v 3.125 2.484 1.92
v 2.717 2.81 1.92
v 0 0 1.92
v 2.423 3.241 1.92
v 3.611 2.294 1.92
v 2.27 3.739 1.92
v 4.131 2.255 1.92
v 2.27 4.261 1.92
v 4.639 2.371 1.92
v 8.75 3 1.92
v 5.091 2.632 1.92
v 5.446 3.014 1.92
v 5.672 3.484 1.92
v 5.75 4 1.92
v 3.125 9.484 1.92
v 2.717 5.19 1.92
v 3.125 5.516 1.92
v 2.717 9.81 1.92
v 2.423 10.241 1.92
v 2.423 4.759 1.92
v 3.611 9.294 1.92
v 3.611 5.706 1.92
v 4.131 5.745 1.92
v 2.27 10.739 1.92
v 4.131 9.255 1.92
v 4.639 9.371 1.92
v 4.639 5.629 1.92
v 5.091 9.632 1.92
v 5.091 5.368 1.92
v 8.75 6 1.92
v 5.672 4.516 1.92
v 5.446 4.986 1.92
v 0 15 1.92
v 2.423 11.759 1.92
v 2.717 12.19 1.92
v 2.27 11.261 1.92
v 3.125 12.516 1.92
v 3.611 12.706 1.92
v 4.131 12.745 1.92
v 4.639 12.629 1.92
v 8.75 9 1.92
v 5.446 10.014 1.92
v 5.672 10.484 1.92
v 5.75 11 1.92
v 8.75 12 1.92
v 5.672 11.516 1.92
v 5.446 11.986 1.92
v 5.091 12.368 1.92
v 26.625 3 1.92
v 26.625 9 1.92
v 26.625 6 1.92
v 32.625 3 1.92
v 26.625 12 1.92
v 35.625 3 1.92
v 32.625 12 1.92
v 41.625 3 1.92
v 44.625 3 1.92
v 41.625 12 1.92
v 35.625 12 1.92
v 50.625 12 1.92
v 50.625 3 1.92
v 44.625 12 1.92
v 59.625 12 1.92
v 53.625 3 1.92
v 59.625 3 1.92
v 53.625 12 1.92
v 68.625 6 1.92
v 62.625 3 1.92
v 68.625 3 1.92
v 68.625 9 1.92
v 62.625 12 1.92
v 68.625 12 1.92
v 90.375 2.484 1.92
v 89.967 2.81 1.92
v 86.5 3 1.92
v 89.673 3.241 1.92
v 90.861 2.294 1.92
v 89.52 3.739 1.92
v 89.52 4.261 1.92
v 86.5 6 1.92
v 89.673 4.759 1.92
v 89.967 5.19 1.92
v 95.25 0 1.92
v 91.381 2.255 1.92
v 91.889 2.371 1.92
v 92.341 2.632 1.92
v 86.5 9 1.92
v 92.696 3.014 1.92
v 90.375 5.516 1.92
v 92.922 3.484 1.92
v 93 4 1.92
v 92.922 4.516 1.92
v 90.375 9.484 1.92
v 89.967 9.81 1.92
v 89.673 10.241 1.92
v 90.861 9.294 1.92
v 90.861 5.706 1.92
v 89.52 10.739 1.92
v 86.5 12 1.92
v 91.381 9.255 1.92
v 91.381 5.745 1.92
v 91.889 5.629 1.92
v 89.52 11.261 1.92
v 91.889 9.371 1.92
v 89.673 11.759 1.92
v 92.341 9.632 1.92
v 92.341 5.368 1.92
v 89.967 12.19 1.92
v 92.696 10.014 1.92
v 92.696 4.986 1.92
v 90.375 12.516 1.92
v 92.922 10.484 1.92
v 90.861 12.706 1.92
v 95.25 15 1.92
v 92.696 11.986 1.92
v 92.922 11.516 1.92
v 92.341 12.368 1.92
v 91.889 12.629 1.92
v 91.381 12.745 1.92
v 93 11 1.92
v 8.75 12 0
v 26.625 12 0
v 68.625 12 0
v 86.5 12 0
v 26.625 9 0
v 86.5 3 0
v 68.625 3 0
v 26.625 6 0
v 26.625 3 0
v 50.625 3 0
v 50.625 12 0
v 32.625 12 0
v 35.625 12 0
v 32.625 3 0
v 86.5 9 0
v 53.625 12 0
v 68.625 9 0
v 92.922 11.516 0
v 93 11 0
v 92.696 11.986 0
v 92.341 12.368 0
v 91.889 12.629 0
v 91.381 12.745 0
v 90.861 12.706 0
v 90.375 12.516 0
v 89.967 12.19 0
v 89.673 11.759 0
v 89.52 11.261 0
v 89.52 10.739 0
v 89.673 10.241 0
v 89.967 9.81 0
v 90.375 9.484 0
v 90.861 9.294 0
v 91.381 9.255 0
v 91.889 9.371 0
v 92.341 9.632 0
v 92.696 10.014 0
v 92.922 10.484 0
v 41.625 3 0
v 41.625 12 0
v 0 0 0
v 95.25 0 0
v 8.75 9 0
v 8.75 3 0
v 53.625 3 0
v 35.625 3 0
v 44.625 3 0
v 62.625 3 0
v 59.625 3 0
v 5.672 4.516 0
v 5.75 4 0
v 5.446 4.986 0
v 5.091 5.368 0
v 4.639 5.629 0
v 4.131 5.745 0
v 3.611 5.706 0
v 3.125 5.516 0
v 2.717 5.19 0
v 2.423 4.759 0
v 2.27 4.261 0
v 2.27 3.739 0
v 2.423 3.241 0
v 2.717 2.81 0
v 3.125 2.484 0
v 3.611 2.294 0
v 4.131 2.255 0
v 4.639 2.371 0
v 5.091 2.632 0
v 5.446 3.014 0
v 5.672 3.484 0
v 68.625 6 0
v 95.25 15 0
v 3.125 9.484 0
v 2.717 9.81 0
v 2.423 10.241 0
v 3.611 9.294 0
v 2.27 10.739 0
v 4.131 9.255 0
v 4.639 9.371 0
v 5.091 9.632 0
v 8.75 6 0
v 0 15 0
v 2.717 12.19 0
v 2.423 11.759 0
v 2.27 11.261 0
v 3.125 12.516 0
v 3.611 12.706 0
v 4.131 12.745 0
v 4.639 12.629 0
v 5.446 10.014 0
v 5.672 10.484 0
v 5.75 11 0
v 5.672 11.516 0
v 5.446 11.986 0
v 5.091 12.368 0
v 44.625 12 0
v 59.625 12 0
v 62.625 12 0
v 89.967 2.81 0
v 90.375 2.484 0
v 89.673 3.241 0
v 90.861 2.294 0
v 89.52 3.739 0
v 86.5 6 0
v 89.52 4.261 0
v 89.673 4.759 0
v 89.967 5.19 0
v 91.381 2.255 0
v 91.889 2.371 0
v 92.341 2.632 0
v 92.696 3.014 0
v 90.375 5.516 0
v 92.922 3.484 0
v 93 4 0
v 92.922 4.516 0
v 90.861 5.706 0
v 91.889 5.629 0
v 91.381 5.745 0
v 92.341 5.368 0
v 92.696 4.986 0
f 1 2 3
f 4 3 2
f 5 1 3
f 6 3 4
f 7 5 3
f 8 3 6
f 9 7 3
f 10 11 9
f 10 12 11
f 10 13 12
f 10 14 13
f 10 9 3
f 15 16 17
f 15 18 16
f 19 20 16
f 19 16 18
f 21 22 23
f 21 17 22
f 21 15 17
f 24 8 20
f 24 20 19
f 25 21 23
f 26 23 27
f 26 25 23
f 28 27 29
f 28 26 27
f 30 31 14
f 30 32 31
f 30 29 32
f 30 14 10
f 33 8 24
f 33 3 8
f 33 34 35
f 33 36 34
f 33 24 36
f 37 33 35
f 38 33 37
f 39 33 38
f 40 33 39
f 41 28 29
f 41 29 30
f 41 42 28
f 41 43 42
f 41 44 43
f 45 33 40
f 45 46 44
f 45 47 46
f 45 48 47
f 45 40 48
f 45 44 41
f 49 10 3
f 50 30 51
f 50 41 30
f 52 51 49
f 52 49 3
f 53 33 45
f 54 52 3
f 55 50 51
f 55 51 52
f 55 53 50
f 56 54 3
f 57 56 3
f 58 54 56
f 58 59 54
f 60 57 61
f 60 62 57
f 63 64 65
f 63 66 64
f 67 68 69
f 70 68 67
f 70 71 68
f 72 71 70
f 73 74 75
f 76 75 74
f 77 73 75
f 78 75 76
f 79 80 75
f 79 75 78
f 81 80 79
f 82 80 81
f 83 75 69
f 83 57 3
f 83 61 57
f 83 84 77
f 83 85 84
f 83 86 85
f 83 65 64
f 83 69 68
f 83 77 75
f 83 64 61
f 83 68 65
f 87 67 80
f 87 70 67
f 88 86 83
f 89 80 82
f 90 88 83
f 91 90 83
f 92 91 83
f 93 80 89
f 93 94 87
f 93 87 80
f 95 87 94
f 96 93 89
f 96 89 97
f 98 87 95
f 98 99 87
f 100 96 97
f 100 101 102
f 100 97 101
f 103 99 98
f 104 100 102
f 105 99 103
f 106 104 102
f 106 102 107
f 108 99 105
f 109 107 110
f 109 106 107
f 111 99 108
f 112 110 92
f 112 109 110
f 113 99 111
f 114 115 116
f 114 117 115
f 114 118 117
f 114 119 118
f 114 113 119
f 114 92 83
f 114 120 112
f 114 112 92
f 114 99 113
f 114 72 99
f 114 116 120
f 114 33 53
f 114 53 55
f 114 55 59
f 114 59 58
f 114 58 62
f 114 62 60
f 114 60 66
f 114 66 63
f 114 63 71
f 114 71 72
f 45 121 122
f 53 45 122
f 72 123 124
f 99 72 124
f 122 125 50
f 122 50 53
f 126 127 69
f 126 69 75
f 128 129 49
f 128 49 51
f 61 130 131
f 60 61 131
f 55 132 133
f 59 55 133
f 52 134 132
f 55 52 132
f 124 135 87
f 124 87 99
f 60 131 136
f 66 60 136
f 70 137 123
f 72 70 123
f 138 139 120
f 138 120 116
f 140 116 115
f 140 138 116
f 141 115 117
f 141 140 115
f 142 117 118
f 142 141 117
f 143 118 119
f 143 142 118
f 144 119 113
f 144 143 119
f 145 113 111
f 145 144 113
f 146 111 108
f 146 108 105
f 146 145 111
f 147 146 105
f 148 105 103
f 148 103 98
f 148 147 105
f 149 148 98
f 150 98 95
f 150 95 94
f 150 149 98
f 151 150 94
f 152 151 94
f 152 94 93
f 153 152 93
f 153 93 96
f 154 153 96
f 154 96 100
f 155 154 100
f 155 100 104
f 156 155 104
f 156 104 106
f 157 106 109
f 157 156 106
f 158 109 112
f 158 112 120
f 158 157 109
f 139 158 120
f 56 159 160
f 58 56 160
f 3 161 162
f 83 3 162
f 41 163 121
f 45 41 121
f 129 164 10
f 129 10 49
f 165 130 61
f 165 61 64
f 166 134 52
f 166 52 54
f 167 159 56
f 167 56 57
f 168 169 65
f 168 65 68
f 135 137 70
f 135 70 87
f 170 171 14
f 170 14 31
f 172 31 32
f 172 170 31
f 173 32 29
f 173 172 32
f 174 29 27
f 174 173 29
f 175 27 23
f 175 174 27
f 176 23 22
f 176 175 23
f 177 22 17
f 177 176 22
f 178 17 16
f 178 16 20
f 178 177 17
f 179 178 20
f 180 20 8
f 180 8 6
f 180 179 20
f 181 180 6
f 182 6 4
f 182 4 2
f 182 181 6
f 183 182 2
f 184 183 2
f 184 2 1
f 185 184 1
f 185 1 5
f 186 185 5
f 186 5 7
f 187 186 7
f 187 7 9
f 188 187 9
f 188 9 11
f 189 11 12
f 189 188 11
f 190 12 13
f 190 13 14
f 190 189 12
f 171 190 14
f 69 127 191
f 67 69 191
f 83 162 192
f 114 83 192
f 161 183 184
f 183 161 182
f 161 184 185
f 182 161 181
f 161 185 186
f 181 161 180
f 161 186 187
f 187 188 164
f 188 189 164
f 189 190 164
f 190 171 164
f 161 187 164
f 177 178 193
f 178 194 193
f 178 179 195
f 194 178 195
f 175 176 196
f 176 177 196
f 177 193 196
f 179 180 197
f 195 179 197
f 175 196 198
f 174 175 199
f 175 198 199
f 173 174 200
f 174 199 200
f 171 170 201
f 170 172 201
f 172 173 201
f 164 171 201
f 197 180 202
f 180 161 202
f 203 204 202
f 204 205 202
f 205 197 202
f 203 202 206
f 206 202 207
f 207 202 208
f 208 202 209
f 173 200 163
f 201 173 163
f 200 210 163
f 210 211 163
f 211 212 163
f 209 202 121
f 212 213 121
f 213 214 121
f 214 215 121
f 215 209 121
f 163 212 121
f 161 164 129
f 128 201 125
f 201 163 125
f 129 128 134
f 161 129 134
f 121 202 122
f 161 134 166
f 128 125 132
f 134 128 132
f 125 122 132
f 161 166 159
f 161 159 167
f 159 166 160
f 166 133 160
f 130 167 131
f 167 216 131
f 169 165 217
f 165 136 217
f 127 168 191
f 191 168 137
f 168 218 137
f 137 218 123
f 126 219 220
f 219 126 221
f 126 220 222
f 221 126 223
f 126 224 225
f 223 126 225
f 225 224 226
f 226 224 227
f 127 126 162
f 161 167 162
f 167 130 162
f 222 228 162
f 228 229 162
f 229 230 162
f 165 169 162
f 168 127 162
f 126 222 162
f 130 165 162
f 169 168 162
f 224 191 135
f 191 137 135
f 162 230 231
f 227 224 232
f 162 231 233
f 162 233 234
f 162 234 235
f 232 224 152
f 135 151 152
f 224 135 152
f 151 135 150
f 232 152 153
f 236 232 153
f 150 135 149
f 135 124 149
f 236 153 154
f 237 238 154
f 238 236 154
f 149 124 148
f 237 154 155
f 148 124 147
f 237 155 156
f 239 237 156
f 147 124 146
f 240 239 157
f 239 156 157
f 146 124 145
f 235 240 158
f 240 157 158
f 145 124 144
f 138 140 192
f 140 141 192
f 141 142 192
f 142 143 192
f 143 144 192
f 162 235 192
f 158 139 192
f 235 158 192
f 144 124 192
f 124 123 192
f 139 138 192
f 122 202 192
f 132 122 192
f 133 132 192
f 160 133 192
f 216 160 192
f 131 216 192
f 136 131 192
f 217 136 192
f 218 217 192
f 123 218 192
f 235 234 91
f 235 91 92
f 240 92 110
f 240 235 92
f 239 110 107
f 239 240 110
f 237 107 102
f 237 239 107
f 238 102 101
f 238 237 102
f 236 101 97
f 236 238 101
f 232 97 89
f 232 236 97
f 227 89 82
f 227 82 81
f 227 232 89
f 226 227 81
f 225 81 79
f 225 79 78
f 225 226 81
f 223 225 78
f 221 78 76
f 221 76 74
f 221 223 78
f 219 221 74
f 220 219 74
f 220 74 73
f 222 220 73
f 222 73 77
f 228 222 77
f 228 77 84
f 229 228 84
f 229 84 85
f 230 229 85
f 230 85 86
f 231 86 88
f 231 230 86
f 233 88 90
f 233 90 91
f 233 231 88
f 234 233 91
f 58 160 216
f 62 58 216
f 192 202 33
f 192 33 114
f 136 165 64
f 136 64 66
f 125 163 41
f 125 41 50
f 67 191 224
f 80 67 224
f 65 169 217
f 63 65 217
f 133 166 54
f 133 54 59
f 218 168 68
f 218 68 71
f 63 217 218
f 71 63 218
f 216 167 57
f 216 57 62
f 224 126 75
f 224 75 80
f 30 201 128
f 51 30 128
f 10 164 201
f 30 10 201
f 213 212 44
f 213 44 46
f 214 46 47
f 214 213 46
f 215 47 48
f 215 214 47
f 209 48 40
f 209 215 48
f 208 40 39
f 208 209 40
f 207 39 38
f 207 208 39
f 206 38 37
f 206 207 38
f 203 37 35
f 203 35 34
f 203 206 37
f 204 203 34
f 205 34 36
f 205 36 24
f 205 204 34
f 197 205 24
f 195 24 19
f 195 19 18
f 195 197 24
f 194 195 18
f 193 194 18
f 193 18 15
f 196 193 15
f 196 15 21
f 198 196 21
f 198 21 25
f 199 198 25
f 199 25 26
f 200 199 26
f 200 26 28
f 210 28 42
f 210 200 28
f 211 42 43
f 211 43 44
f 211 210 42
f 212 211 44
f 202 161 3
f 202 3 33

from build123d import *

# Parameters (mm, degrees)
F0_W     = 95.25
F0_H     = 15
F0_R     = 1.75
F0_W_2   = 17.875
F0_H_2   = 3
F0_W_3   = 3
F0_H_3   = 9
F1_DEPTH = 1.92


with BuildPart() as f1:
    # F0 (on Top) → F1 (new body)
    with BuildSketch(Plane.XY):
        with Locations((47.625, 7.5)):
            Rectangle(F0_W, F0_H)
        with Locations((4, 4)):
            Circle(F0_R, mode=Mode.SUBTRACT)
        with Locations((17.6875, 4.5)):
            Rectangle(F0_W_2, F0_H_2, mode=Mode.SUBTRACT)
        with Locations((77.5625, 4.5)):
            Rectangle(F0_W_2, F0_H_2, mode=Mode.SUBTRACT)
        with Locations((91.25, 4)):
            Circle(F0_R, mode=Mode.SUBTRACT)
        with Locations((4, 11)):
            Circle(F0_R, mode=Mode.SUBTRACT)
        with Locations((17.6875, 10.5)):
            Rectangle(F0_W_2, F0_H_2, mode=Mode.SUBTRACT)
        with Locations((34.125, 7.5)):
            Rectangle(F0_W_3, F0_H_3, mode=Mode.SUBTRACT)
        with Locations((43.125, 7.5)):
            Rectangle(F0_W_3, F0_H_3, mode=Mode.SUBTRACT)
        with Locations((52.125, 7.5)):
            Rectangle(F0_W_3, F0_H_3, mode=Mode.SUBTRACT)
        with Locations((61.125, 7.5)):
            Rectangle(F0_W_3, F0_H_3, mode=Mode.SUBTRACT)
        with Locations((77.5625, 10.5)):
            Rectangle(F0_W_2, F0_H_2, mode=Mode.SUBTRACT)
        with Locations((91.25, 11)):
            Circle(F0_R, mode=Mode.SUBTRACT)
    extrude(amount=F1_DEPTH)


solid = f1.part
